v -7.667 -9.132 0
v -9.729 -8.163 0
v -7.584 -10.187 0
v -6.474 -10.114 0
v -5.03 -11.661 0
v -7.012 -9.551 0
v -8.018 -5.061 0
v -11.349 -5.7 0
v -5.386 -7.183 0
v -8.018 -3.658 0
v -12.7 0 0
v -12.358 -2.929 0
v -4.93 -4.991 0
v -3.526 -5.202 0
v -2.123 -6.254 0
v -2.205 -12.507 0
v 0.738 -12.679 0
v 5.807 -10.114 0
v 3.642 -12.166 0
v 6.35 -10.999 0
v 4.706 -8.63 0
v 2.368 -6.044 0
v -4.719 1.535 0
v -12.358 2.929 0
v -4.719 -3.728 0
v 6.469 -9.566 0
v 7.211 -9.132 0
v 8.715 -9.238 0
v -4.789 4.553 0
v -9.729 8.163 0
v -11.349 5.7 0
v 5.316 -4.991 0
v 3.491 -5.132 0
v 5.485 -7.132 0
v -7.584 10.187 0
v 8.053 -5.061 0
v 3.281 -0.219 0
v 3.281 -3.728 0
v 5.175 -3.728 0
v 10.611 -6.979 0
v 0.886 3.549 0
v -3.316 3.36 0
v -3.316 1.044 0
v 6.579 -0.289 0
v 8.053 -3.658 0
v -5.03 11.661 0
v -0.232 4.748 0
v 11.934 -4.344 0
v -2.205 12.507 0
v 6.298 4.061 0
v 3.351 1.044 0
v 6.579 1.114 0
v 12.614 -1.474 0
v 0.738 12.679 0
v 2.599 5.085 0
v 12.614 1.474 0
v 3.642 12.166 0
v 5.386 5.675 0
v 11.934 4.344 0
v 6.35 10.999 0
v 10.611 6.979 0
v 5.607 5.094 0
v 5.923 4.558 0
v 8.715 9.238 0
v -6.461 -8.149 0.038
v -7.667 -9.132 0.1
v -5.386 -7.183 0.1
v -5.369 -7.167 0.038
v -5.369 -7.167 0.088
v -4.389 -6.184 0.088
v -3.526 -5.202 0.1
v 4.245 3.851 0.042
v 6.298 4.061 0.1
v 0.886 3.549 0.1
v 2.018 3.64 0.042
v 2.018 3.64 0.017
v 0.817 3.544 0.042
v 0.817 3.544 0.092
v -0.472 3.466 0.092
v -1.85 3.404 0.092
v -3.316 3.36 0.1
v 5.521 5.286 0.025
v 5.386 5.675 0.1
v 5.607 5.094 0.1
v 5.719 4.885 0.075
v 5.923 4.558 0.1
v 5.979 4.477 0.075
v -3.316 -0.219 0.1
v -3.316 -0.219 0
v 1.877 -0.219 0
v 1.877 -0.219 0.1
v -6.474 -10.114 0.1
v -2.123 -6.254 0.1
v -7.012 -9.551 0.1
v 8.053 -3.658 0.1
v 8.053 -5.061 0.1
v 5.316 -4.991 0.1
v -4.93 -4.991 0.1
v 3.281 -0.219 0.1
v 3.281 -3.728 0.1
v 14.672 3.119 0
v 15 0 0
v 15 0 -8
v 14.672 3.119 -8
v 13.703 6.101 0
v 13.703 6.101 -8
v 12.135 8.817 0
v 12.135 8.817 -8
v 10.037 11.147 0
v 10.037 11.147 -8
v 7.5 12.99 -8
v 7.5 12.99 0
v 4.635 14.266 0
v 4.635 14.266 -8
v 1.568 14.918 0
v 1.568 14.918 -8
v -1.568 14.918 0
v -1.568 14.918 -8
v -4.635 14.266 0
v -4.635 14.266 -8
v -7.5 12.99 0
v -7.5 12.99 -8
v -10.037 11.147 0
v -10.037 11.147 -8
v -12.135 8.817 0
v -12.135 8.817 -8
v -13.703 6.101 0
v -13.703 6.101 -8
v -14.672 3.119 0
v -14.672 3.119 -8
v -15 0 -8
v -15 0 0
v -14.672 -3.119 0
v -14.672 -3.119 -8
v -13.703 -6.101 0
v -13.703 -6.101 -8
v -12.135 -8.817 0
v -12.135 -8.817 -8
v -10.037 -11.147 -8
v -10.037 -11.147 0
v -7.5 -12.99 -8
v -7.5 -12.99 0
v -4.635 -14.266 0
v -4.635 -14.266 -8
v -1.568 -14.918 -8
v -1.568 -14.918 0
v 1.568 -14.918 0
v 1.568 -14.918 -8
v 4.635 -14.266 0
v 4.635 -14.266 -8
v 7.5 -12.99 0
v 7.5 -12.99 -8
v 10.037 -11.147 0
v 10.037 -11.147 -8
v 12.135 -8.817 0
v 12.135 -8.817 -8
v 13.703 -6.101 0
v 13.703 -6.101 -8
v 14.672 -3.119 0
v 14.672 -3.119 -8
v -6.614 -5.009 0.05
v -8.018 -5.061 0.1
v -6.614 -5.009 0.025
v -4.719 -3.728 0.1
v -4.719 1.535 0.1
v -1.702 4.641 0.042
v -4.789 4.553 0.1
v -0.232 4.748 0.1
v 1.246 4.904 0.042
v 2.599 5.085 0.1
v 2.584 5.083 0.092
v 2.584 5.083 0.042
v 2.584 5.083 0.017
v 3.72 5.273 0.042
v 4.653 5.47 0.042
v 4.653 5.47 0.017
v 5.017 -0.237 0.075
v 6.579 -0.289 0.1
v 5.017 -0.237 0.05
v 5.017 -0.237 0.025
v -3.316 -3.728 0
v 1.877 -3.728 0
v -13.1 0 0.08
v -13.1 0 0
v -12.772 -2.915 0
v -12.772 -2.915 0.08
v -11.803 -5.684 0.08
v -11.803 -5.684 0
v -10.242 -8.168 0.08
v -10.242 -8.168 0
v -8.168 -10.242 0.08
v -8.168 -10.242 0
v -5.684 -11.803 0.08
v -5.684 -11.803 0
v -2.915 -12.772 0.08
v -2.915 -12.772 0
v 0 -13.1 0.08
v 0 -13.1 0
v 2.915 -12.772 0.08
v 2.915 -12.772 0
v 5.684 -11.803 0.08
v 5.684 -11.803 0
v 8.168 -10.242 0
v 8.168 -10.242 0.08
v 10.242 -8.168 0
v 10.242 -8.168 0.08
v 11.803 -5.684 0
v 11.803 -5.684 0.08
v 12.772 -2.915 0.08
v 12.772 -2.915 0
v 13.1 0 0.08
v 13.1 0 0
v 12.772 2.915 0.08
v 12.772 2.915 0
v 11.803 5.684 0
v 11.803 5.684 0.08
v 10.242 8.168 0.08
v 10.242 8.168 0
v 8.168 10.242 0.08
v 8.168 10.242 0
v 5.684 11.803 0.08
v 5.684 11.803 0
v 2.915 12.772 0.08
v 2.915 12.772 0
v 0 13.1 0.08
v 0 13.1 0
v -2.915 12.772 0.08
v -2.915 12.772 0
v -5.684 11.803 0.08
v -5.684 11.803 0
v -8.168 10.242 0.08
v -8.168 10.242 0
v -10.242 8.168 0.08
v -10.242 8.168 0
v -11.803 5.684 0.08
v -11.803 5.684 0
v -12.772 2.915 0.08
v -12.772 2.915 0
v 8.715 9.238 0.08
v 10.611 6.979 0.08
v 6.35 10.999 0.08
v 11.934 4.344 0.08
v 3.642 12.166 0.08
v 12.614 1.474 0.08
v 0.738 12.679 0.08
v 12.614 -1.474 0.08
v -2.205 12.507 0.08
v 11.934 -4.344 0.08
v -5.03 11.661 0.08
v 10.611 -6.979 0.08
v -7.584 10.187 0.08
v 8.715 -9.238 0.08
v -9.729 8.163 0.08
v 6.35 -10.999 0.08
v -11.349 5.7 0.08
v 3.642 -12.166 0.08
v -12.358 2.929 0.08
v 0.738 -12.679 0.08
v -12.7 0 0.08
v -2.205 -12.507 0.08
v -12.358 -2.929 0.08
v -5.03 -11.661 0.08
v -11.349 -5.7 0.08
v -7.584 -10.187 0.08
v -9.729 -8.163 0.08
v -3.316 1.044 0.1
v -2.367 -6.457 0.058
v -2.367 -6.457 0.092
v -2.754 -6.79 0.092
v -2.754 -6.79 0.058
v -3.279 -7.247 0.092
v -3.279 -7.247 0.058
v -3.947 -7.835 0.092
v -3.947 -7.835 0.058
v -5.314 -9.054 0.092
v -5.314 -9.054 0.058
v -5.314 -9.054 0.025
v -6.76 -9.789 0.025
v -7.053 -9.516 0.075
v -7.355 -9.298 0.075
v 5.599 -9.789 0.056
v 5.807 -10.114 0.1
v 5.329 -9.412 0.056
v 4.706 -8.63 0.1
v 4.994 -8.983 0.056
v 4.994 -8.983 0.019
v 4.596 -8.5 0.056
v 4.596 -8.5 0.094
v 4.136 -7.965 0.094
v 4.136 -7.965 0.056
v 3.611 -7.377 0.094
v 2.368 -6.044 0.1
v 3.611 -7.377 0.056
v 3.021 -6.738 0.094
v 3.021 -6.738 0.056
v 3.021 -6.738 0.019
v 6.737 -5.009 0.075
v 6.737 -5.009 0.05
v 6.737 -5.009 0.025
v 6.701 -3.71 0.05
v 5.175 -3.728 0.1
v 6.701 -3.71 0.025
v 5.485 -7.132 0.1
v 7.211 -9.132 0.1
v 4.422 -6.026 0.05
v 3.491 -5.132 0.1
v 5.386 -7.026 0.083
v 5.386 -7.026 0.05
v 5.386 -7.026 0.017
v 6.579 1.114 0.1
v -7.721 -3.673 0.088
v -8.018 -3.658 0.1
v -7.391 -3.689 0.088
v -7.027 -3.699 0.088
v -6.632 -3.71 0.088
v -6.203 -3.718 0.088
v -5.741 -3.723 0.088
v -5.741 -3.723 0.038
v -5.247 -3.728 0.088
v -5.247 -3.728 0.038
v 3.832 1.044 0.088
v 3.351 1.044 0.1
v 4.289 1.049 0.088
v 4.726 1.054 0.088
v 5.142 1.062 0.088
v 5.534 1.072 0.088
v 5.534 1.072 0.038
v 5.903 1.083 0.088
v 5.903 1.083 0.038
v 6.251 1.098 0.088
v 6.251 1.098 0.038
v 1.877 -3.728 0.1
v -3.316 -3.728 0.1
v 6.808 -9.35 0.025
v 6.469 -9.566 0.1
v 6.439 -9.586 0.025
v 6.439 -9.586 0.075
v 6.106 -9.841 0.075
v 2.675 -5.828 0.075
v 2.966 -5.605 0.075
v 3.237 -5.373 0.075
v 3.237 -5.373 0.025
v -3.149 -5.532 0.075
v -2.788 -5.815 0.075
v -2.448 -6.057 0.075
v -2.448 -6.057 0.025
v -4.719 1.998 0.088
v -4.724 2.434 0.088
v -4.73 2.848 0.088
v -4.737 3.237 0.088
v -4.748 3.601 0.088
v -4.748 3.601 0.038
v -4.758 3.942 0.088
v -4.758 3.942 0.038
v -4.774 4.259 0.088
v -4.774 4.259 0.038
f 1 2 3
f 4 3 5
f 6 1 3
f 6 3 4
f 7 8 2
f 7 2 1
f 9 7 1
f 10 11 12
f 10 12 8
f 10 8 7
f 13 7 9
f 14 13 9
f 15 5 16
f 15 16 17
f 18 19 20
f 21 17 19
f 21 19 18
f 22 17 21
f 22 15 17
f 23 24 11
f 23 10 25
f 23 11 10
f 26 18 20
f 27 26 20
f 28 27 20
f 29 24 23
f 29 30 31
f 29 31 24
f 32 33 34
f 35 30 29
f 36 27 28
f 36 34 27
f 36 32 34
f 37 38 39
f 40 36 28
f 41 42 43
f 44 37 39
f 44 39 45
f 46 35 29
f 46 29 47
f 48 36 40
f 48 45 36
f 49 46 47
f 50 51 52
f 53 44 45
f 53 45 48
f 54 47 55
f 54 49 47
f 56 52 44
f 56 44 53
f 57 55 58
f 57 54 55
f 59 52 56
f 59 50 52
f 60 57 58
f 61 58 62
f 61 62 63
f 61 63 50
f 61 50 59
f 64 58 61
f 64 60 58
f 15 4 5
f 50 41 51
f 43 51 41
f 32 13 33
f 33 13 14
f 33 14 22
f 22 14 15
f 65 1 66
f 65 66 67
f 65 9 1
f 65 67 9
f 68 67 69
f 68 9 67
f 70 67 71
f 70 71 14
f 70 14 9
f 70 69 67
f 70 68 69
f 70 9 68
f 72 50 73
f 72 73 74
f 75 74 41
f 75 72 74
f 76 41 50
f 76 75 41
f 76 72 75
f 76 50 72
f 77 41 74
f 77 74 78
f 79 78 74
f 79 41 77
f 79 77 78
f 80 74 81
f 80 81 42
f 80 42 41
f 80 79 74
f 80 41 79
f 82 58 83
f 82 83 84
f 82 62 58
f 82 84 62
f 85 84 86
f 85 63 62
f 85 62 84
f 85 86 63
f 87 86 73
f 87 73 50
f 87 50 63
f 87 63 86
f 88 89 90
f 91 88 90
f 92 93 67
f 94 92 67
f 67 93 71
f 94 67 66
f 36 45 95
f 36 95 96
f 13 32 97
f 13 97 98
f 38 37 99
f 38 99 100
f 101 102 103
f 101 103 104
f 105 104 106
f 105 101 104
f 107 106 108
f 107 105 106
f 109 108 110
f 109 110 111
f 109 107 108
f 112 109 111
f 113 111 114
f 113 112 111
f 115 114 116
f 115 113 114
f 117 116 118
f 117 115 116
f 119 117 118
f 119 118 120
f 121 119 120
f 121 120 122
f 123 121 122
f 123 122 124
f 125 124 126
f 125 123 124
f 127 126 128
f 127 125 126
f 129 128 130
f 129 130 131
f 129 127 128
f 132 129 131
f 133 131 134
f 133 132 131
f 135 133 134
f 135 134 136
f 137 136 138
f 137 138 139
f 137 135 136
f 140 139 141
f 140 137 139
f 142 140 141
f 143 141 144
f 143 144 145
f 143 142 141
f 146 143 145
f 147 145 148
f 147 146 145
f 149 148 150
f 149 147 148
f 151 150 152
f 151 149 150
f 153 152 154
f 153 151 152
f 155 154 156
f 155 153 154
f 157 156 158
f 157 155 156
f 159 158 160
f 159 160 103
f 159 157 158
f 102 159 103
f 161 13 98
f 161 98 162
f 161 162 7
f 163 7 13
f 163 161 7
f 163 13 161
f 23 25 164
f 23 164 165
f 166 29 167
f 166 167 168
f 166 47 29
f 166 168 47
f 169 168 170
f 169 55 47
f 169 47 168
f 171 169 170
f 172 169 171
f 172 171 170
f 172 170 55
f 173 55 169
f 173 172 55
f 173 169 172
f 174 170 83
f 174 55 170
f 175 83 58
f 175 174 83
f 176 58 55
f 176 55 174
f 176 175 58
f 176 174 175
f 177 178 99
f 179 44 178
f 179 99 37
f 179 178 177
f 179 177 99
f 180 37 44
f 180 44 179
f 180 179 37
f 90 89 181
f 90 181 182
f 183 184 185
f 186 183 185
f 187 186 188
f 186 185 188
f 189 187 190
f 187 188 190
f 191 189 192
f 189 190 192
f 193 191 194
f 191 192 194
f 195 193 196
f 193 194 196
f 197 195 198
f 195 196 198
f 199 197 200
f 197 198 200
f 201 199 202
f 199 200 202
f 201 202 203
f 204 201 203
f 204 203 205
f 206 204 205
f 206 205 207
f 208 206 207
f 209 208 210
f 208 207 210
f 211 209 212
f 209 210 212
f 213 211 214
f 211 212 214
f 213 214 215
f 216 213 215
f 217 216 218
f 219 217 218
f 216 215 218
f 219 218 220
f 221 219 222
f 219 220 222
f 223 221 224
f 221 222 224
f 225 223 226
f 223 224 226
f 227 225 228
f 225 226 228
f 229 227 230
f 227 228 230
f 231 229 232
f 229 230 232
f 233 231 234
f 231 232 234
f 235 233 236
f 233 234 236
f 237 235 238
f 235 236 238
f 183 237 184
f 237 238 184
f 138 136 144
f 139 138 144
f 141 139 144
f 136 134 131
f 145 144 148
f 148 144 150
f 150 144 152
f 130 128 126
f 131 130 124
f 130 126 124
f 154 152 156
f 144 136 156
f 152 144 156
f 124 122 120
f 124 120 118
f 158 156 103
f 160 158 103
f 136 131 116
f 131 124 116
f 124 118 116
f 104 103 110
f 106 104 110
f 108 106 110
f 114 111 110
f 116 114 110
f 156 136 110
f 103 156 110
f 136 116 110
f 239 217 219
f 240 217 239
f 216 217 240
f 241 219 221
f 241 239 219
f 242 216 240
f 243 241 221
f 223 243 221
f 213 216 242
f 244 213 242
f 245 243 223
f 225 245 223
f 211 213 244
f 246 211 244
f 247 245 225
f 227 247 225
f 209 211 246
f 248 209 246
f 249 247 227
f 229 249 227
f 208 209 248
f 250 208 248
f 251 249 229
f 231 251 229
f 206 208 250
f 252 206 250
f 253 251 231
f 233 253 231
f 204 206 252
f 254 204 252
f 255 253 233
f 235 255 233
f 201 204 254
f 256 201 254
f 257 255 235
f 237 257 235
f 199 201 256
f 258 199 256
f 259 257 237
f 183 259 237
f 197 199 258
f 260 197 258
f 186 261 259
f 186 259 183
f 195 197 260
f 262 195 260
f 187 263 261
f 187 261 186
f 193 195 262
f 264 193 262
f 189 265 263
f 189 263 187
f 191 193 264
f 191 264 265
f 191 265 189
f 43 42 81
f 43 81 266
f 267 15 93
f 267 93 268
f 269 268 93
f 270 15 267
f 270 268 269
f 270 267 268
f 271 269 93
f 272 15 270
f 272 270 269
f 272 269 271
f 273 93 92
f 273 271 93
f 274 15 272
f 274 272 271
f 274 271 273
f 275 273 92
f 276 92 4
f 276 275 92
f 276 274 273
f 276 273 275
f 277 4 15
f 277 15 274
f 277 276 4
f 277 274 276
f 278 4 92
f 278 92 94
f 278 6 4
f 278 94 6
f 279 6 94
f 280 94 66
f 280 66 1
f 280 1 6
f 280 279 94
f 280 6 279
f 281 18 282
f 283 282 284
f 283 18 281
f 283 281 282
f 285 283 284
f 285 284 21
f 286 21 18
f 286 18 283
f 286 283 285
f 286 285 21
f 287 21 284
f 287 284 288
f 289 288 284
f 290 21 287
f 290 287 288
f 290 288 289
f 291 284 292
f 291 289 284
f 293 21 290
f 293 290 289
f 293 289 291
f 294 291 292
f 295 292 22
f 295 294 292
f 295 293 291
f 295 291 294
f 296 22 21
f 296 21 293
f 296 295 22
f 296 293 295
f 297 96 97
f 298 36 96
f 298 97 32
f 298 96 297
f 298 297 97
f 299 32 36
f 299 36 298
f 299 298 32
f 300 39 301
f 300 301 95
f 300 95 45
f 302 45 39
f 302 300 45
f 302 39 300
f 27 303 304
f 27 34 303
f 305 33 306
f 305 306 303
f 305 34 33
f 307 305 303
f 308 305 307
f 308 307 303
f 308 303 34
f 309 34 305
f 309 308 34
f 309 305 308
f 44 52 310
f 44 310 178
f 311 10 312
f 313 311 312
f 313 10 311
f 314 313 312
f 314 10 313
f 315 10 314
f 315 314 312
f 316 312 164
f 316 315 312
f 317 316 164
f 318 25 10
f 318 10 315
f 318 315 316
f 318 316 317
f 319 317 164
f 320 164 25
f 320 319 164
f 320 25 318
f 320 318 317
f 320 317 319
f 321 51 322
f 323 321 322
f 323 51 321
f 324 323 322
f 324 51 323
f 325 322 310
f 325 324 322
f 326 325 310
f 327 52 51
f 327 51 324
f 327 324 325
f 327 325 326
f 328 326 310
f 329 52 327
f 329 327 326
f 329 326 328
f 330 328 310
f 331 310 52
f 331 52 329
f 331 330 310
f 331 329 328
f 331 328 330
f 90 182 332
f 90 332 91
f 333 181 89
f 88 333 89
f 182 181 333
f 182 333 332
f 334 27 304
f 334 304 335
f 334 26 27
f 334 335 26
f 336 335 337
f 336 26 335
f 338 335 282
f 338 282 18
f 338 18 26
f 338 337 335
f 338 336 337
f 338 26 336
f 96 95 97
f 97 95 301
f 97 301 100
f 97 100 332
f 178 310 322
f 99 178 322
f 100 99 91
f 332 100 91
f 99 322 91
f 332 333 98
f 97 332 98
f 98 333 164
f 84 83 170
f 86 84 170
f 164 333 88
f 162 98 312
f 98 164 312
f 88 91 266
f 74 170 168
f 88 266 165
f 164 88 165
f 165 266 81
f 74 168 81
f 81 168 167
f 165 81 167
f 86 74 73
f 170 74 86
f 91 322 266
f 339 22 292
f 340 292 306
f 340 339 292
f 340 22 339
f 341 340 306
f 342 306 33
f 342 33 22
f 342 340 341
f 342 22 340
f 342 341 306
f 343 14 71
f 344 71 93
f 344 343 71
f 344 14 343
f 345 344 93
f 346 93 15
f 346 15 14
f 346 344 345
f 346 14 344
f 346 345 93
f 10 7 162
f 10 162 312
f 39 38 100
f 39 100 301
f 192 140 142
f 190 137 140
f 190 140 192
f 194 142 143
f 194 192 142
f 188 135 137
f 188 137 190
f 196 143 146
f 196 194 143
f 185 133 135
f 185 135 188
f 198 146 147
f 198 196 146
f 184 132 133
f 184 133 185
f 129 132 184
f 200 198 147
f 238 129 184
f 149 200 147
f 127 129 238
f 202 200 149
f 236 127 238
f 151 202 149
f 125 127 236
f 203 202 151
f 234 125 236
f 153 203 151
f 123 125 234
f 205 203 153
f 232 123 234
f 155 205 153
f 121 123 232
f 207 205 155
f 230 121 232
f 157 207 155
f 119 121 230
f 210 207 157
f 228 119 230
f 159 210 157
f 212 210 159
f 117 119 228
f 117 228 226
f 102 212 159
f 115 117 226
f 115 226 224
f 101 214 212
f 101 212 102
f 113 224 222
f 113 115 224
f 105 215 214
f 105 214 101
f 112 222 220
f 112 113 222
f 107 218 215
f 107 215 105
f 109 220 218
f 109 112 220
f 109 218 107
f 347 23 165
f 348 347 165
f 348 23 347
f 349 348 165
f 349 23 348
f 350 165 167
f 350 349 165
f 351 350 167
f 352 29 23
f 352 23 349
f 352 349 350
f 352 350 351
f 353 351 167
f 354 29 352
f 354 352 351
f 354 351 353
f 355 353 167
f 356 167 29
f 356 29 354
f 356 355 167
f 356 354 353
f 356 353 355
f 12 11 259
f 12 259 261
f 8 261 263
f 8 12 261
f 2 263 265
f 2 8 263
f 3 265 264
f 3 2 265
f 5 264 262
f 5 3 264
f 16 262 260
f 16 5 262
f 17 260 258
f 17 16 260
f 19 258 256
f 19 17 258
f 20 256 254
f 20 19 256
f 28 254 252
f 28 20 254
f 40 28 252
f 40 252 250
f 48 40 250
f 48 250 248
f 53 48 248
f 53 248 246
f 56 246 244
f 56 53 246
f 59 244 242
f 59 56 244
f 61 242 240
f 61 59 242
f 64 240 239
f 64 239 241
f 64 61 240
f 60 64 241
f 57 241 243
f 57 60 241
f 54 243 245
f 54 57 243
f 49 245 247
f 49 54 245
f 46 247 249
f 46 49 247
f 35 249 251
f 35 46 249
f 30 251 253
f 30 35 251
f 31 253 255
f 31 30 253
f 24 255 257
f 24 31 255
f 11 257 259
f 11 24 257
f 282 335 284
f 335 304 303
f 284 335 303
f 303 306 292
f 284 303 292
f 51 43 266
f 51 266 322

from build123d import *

# Parameters (mm, degrees)
SKETCH_1_R               = 15
DIAMETER30_HEIGHT8_DEPTH = 8
SKETCH_2_W               = 5.192982456
SKETCH_2_H               = 3.508771929
CHARACTER_DEPTH          = 0.1
SKETCH_3_R               = 13.1
SKETCH_3_R_2             = 12.7
INK_RING_DEPTH           = 0.08


with BuildPart() as part:
    # 草图1 → Diameter30_Height8 (new body)
    with BuildSketch(Plane.XY):
        Circle(SKETCH_1_R)
    extrude(amount=-DIAMETER30_HEIGHT8_DEPTH)

    # 草图2 → Character_兵 (add)
    # profile 1 of 3: a face of its own
    with BuildSketch(Plane.XY):
        with BuildLine():
            add(Edge.make_bspline(
                [(5.385964912, 5.675438596), (5.427646333, 5.544154901), (5.514415642, 5.270858182), (5.718534697, 4.870645294), (5.979105034, 4.460896452), (6.189038604, 4.198106369), (6.298245614, 4.061403509)],
                knots=[0, 0, 0, 0, 0.883893952, 1.840025262, 2.876385589, 4, 4, 4, 4], degree=3))
            add(Edge.make_bspline(
                [(6.298245614, 4.061403509), (5.963833471, 4.026716097), (5.279490907, 3.955731615), (4.231500891, 3.847667949), (3.138573287, 3.746554234), (2.199926718, 3.654410468), (1.420771678, 3.589929187), (0.809223667, 3.542341458), (0.175852477, 3.501012073), (-0.480095669, 3.465441213), (-1.157529916, 3.430930645), (-1.857588828, 3.402476855), (-2.579333786, 3.379715375), (-3.06800455, 3.366400533), (-3.315789474, 3.359649123)],
                knots=[0, 0, 0, 0, 1.255148332, 2.568541377, 3.933119286, 5.35274168, 6.089508688, 6.851809632, 7.642688325, 8.45900384, 9.304218247, 10.174988169, 11.074611272, 12, 12, 12, 12], degree=3))
            Line((-3.315789474, 3.359649123), (-3.315789474, 1.043859649))
            Line((-3.315789474, 1.043859649), (3.350877193, 1.043859649))
            add(Edge.make_bspline(
                [(3.350877193, 1.043859649), (3.511157354, 1.043351179), (3.823930109, 1.042358944), (4.282215924, 1.049417071), (4.718886002, 1.053533845), (5.133897674, 1.061104446), (5.526304771, 1.072707016), (5.896383806, 1.080969698), (6.244544047, 1.09823882), (6.469784841, 1.108878558), (6.578947368, 1.114035088)],
                knots=[0, 0, 0, 0, 1.191206585, 2.324535747, 3.406356757, 4.43677056, 5.409393768, 6.324087995, 7.187772401, 8, 8, 8, 8], degree=3))
            Line((6.578947368, 1.114035088), (6.578947368, -0.289473684))
            add(Edge.make_bspline(
                [(6.578947368, -0.289473684), (6.325999471, -0.278216628), (5.805513386, -0.255053199), (5.003105502, -0.23621154), (4.156642469, -0.222539126), (3.577870773, -0.220397737), (3.280701754, -0.219298246)],
                knots=[0, 0, 0, 0, 0.920900528, 1.894919528, 2.91915119, 4, 4, 4, 4], degree=3))
            Line((3.280701754, -0.219298246), (3.280701754, -3.728070175))
            Line((3.280701754, -3.728070175), (5.175438596, -3.728070175))
            add(Edge.make_bspline(
                [(5.175438596, -3.728070175), (5.437087744, -3.726975877), (5.945690026, -3.724848744), (6.687326433, -3.711192023), (7.384937776, -3.692513148), (7.835209995, -3.669167553), (8.052631579, -3.657894737)],
                knots=[0, 0, 0, 0, 1.090812078, 2.120356657, 3.092382303, 4, 4, 4, 4], degree=3))
            Line((8.052631579, -3.657894737), (8.052631579, -5.061403509))
            add(Edge.make_bspline(
                [(8.052631579, -5.061403509), (7.837808318, -5.050169454), (7.399653446, -5.027256405), (6.728050321, -5.008178757), (6.030595105, -4.994576557), (5.556645778, -4.992356355), (5.315789474, -4.99122807)],
                knots=[0, 0, 0, 0, 0.942753637, 1.922846234, 2.944411245, 4, 4, 4, 4], degree=3))
            Line((5.315789474, -4.99122807), (-4.929824561, -4.99122807))
            add(Edge.make_bspline(
                [(-4.929824561, -4.99122807), (-5.221796086, -4.992303015), (-5.783243216, -4.994370081), (-6.589858446, -5.007824944), (-7.327331729, -5.026367125), (-7.794924107, -5.050102938), (-8.01754386, -5.061403509)],
                knots=[0, 0, 0, 0, 1.134280796, 2.181167151, 3.134057485, 4, 4, 4, 4], degree=3))
            Line((-8.01754386, -5.061403509), (-8.01754386, -3.657894737))
            add(Edge.make_bspline(
                [(-8.01754386, -3.657894737), (-7.918780668, -3.663109409), (-7.710021339, -3.67413185), (-7.380044631, -3.691202686), (-7.016884144, -3.699292609), (-6.621013356, -3.710966152), (-6.192136611, -3.718460184), (-5.730343207, -3.722568458), (-5.235668056, -3.729595696), (-4.895172776, -3.728589765), (-4.719298246, -3.728070175)],
                knots=[0, 0, 0, 0, 0.719411058, 1.520645164, 2.403271333, 3.3614919, 4.401477414, 5.52328659, 6.720714106, 8, 8, 8, 8], degree=3))
            Line((-4.719298246, -3.728070175), (-4.719298246, 1.535087719))
            add(Edge.make_bspline(
                [(-4.719298246, 1.535087719), (-4.718784553, 1.689303498), (-4.717785992, 1.989081562), (-4.724827935, 2.426573997), (-4.728954195, 2.839853385), (-4.736476359, 3.228877821), (-4.748135548, 3.593555392), (-4.756324903, 3.934194089), (-4.77353537, 4.251158894), (-4.784297949, 4.45473273), (-4.789473684, 4.552631579)],
                knots=[0, 0, 0, 0, 1.226022714, 2.383249742, 3.478491498, 4.511863319, 5.476544353, 6.379262498, 7.220585815, 8, 8, 8, 8], degree=3))
            add(Edge.make_bspline(
                [(-4.789473684, 4.552631579), (-4.268706026, 4.556028892), (-3.23884814, 4.562747339), (-1.711781979, 4.634250298), (-0.219866652, 4.740633472), (0.993183313, 4.869797657), (1.923704926, 4.988295648), (2.567560235, 5.078693798), (3.161212168, 5.171746835), (3.703352911, 5.268528417), (4.196476895, 5.362226591), (4.637690365, 5.465343924), (5.030740941, 5.563211427), (5.272785841, 5.639681531), (5.385964912, 5.675438596)],
                knots=[0, 0, 0, 0, 1.826039719, 3.611133242, 5.359645429, 7.070379028, 7.888093123, 8.64899991, 9.350260421, 9.995089588, 10.580183652, 11.110071571, 11.583873602, 12, 12, 12, 12], degree=3))
        make_face()
        with Locations((-0.719298246, -1.973684211)):
            Rectangle(SKETCH_2_W, SKETCH_2_H, mode=Mode.SUBTRACT)
    # profile 2 of 3: a face of its own
    with BuildSketch(Plane.XY):
        with BuildLine():
            add(Edge.make_bspline(
                [(-2.122807018, -6.254385965), (-2.157477947, -6.282955909), (-2.239146675, -6.350253527), (-2.380099943, -6.467370774), (-2.555580621, -6.61772706), (-2.766181537, -6.799581185), (-3.010546273, -7.013645708), (-3.292157091, -7.257784349), (-3.608078345, -7.535369573), (-4.067550245, -7.940488445), (-4.641654961, -8.448307776), (-5.298106508, -9.038691618), (-5.905984263, -9.586353364), (-6.289571124, -9.942900475), (-6.473684211, -10.114035088)],
                knots=[0, 0, 0, 0, 0.2780539, 0.654966813, 1.134206325, 1.708249881, 2.37711475, 3.1448483, 4.014977533, 4.979944052, 6.936134783, 8.758754283, 10.444274784, 12, 12, 12, 12], degree=3))
            add(Edge.make_bspline(
                [(-6.473684211, -10.114035088), (-6.56675088, -10.003646022), (-6.746034395, -9.790992666), (-7.041333181, -9.517105251), (-7.343912266, -9.291855461), (-7.560952619, -9.184075455), (-7.666666667, -9.131578947)],
                knots=[0, 0, 0, 0, 1.110089453, 2.138474913, 3.093305237, 4, 4, 4, 4], degree=3))
            add(Edge.make_bspline(
                [(-7.666666667, -9.131578947), (-7.459526486, -8.969004344), (-7.051586638, -8.648831509), (-6.464306615, -8.155016872), (-5.902342388, -7.666058703), (-5.371814437, -7.172889256), (-4.86718458, -6.682628792), (-4.391277213, -6.192029207), (-3.945527473, -5.699881064), (-3.664825977, -5.366338586), (-3.526315789, -5.201754386)],
                knots=[0, 0, 0, 0, 1.104789882, 2.175762404, 3.219109849, 4.230036466, 5.214606813, 6.170942573, 7.097464421, 8, 8, 8, 8], degree=3))
            add(Edge.make_bspline(
                [(-3.526315789, -5.201754386), (-3.402072492, -5.313438732), (-3.163971761, -5.527471401), (-2.800509792, -5.808406095), (-2.461726053, -6.055622784), (-2.232199656, -6.190231325), (-2.122807018, -6.254385965)],
                knots=[0, 0, 0, 0, 1.1399807, 2.184667066, 3.134809496, 4, 4, 4, 4], degree=3))
        make_face()
    # profile 3 of 3: a face of its own
    with BuildSketch(Plane.XY):
        with BuildLine():
            add(Edge.make_bspline(
                [(3.49122807, -5.131578947), (3.64506879, -5.27574038), (3.958953573, -5.569876289), (4.429694762, -6.029809869), (4.906171195, -6.5186042), (5.550446937, -7.196959293), (6.333416052, -8.059114332), (6.921508711, -8.778189908), (7.210526316, -9.131578947)],
                knots=[0, 0, 0, 0, 0.694198963, 1.416390223, 2.166820141, 2.941675304, 4.4969891, 6, 6, 6, 6], degree=3))
            add(Edge.make_bspline(
                [(7.210526316, -9.131578947), (7.075068051, -9.202301891), (6.810022921, -9.340682313), (6.440864575, -9.578307626), (6.104530191, -9.83226378), (5.905037831, -10.021201035), (5.807017544, -10.114035088)],
                knots=[0, 0, 0, 0, 1.065427554, 2.08467446, 3.058907518, 4, 4, 4, 4], degree=3))
            add(Edge.make_bspline(
                [(5.807017544, -10.114035088), (5.775308721, -10.061834257), (5.708542231, -9.951919541), (5.596075389, -9.783319805), (5.468667601, -9.601351476), (5.325294262, -9.406676418), (5.167099041, -9.197729098), (4.988610452, -8.978683169), (4.801321577, -8.740479229), (4.591580283, -8.495595111), (4.370378942, -8.233593029), (4.132600709, -7.959359408), (3.876016732, -7.67337978), (3.606767352, -7.371008487), (3.318813913, -7.058440113), (3.015682826, -6.732539485), (2.699522295, -6.391233684), (2.480469315, -6.161414802), (2.368421053, -6.043859649)],
                knots=[0, 0, 0, 0, 0.549342762, 1.156702925, 1.82258923, 2.54738719, 3.331395419, 4.179695988, 5.088851071, 6.056731025, 7.079525855, 8.173336188, 9.321433762, 10.535553977, 11.815185591, 13.144150694, 14.539198359, 16, 16, 16, 16], degree=3))
            add(Edge.make_bspline(
                [(2.368421053, -6.043859649), (2.471264109, -5.972803187), (2.674770245, -5.832196455), (2.965216422, -5.609367892), (3.237954519, -5.37712719), (3.407172595, -5.213070577), (3.49122807, -5.131578947)],
                knots=[0, 0, 0, 0, 1.035169059, 2.048395507, 3.030582027, 4, 4, 4, 4], degree=3))
        make_face()
    extrude(amount=CHARACTER_DEPTH)

    # 草图3 → Ink_ring (add)
    with BuildSketch(Plane.XY):
        with Locations(Location((0, 0, 0), (0, 0, 180))):
            Circle(SKETCH_3_R)
        with Locations(Location((0, 0, 0), (0, 0, 180))):
            Circle(SKETCH_3_R_2, mode=Mode.SUBTRACT)
    extrude(amount=INK_RING_DEPTH)


solid = part.part
